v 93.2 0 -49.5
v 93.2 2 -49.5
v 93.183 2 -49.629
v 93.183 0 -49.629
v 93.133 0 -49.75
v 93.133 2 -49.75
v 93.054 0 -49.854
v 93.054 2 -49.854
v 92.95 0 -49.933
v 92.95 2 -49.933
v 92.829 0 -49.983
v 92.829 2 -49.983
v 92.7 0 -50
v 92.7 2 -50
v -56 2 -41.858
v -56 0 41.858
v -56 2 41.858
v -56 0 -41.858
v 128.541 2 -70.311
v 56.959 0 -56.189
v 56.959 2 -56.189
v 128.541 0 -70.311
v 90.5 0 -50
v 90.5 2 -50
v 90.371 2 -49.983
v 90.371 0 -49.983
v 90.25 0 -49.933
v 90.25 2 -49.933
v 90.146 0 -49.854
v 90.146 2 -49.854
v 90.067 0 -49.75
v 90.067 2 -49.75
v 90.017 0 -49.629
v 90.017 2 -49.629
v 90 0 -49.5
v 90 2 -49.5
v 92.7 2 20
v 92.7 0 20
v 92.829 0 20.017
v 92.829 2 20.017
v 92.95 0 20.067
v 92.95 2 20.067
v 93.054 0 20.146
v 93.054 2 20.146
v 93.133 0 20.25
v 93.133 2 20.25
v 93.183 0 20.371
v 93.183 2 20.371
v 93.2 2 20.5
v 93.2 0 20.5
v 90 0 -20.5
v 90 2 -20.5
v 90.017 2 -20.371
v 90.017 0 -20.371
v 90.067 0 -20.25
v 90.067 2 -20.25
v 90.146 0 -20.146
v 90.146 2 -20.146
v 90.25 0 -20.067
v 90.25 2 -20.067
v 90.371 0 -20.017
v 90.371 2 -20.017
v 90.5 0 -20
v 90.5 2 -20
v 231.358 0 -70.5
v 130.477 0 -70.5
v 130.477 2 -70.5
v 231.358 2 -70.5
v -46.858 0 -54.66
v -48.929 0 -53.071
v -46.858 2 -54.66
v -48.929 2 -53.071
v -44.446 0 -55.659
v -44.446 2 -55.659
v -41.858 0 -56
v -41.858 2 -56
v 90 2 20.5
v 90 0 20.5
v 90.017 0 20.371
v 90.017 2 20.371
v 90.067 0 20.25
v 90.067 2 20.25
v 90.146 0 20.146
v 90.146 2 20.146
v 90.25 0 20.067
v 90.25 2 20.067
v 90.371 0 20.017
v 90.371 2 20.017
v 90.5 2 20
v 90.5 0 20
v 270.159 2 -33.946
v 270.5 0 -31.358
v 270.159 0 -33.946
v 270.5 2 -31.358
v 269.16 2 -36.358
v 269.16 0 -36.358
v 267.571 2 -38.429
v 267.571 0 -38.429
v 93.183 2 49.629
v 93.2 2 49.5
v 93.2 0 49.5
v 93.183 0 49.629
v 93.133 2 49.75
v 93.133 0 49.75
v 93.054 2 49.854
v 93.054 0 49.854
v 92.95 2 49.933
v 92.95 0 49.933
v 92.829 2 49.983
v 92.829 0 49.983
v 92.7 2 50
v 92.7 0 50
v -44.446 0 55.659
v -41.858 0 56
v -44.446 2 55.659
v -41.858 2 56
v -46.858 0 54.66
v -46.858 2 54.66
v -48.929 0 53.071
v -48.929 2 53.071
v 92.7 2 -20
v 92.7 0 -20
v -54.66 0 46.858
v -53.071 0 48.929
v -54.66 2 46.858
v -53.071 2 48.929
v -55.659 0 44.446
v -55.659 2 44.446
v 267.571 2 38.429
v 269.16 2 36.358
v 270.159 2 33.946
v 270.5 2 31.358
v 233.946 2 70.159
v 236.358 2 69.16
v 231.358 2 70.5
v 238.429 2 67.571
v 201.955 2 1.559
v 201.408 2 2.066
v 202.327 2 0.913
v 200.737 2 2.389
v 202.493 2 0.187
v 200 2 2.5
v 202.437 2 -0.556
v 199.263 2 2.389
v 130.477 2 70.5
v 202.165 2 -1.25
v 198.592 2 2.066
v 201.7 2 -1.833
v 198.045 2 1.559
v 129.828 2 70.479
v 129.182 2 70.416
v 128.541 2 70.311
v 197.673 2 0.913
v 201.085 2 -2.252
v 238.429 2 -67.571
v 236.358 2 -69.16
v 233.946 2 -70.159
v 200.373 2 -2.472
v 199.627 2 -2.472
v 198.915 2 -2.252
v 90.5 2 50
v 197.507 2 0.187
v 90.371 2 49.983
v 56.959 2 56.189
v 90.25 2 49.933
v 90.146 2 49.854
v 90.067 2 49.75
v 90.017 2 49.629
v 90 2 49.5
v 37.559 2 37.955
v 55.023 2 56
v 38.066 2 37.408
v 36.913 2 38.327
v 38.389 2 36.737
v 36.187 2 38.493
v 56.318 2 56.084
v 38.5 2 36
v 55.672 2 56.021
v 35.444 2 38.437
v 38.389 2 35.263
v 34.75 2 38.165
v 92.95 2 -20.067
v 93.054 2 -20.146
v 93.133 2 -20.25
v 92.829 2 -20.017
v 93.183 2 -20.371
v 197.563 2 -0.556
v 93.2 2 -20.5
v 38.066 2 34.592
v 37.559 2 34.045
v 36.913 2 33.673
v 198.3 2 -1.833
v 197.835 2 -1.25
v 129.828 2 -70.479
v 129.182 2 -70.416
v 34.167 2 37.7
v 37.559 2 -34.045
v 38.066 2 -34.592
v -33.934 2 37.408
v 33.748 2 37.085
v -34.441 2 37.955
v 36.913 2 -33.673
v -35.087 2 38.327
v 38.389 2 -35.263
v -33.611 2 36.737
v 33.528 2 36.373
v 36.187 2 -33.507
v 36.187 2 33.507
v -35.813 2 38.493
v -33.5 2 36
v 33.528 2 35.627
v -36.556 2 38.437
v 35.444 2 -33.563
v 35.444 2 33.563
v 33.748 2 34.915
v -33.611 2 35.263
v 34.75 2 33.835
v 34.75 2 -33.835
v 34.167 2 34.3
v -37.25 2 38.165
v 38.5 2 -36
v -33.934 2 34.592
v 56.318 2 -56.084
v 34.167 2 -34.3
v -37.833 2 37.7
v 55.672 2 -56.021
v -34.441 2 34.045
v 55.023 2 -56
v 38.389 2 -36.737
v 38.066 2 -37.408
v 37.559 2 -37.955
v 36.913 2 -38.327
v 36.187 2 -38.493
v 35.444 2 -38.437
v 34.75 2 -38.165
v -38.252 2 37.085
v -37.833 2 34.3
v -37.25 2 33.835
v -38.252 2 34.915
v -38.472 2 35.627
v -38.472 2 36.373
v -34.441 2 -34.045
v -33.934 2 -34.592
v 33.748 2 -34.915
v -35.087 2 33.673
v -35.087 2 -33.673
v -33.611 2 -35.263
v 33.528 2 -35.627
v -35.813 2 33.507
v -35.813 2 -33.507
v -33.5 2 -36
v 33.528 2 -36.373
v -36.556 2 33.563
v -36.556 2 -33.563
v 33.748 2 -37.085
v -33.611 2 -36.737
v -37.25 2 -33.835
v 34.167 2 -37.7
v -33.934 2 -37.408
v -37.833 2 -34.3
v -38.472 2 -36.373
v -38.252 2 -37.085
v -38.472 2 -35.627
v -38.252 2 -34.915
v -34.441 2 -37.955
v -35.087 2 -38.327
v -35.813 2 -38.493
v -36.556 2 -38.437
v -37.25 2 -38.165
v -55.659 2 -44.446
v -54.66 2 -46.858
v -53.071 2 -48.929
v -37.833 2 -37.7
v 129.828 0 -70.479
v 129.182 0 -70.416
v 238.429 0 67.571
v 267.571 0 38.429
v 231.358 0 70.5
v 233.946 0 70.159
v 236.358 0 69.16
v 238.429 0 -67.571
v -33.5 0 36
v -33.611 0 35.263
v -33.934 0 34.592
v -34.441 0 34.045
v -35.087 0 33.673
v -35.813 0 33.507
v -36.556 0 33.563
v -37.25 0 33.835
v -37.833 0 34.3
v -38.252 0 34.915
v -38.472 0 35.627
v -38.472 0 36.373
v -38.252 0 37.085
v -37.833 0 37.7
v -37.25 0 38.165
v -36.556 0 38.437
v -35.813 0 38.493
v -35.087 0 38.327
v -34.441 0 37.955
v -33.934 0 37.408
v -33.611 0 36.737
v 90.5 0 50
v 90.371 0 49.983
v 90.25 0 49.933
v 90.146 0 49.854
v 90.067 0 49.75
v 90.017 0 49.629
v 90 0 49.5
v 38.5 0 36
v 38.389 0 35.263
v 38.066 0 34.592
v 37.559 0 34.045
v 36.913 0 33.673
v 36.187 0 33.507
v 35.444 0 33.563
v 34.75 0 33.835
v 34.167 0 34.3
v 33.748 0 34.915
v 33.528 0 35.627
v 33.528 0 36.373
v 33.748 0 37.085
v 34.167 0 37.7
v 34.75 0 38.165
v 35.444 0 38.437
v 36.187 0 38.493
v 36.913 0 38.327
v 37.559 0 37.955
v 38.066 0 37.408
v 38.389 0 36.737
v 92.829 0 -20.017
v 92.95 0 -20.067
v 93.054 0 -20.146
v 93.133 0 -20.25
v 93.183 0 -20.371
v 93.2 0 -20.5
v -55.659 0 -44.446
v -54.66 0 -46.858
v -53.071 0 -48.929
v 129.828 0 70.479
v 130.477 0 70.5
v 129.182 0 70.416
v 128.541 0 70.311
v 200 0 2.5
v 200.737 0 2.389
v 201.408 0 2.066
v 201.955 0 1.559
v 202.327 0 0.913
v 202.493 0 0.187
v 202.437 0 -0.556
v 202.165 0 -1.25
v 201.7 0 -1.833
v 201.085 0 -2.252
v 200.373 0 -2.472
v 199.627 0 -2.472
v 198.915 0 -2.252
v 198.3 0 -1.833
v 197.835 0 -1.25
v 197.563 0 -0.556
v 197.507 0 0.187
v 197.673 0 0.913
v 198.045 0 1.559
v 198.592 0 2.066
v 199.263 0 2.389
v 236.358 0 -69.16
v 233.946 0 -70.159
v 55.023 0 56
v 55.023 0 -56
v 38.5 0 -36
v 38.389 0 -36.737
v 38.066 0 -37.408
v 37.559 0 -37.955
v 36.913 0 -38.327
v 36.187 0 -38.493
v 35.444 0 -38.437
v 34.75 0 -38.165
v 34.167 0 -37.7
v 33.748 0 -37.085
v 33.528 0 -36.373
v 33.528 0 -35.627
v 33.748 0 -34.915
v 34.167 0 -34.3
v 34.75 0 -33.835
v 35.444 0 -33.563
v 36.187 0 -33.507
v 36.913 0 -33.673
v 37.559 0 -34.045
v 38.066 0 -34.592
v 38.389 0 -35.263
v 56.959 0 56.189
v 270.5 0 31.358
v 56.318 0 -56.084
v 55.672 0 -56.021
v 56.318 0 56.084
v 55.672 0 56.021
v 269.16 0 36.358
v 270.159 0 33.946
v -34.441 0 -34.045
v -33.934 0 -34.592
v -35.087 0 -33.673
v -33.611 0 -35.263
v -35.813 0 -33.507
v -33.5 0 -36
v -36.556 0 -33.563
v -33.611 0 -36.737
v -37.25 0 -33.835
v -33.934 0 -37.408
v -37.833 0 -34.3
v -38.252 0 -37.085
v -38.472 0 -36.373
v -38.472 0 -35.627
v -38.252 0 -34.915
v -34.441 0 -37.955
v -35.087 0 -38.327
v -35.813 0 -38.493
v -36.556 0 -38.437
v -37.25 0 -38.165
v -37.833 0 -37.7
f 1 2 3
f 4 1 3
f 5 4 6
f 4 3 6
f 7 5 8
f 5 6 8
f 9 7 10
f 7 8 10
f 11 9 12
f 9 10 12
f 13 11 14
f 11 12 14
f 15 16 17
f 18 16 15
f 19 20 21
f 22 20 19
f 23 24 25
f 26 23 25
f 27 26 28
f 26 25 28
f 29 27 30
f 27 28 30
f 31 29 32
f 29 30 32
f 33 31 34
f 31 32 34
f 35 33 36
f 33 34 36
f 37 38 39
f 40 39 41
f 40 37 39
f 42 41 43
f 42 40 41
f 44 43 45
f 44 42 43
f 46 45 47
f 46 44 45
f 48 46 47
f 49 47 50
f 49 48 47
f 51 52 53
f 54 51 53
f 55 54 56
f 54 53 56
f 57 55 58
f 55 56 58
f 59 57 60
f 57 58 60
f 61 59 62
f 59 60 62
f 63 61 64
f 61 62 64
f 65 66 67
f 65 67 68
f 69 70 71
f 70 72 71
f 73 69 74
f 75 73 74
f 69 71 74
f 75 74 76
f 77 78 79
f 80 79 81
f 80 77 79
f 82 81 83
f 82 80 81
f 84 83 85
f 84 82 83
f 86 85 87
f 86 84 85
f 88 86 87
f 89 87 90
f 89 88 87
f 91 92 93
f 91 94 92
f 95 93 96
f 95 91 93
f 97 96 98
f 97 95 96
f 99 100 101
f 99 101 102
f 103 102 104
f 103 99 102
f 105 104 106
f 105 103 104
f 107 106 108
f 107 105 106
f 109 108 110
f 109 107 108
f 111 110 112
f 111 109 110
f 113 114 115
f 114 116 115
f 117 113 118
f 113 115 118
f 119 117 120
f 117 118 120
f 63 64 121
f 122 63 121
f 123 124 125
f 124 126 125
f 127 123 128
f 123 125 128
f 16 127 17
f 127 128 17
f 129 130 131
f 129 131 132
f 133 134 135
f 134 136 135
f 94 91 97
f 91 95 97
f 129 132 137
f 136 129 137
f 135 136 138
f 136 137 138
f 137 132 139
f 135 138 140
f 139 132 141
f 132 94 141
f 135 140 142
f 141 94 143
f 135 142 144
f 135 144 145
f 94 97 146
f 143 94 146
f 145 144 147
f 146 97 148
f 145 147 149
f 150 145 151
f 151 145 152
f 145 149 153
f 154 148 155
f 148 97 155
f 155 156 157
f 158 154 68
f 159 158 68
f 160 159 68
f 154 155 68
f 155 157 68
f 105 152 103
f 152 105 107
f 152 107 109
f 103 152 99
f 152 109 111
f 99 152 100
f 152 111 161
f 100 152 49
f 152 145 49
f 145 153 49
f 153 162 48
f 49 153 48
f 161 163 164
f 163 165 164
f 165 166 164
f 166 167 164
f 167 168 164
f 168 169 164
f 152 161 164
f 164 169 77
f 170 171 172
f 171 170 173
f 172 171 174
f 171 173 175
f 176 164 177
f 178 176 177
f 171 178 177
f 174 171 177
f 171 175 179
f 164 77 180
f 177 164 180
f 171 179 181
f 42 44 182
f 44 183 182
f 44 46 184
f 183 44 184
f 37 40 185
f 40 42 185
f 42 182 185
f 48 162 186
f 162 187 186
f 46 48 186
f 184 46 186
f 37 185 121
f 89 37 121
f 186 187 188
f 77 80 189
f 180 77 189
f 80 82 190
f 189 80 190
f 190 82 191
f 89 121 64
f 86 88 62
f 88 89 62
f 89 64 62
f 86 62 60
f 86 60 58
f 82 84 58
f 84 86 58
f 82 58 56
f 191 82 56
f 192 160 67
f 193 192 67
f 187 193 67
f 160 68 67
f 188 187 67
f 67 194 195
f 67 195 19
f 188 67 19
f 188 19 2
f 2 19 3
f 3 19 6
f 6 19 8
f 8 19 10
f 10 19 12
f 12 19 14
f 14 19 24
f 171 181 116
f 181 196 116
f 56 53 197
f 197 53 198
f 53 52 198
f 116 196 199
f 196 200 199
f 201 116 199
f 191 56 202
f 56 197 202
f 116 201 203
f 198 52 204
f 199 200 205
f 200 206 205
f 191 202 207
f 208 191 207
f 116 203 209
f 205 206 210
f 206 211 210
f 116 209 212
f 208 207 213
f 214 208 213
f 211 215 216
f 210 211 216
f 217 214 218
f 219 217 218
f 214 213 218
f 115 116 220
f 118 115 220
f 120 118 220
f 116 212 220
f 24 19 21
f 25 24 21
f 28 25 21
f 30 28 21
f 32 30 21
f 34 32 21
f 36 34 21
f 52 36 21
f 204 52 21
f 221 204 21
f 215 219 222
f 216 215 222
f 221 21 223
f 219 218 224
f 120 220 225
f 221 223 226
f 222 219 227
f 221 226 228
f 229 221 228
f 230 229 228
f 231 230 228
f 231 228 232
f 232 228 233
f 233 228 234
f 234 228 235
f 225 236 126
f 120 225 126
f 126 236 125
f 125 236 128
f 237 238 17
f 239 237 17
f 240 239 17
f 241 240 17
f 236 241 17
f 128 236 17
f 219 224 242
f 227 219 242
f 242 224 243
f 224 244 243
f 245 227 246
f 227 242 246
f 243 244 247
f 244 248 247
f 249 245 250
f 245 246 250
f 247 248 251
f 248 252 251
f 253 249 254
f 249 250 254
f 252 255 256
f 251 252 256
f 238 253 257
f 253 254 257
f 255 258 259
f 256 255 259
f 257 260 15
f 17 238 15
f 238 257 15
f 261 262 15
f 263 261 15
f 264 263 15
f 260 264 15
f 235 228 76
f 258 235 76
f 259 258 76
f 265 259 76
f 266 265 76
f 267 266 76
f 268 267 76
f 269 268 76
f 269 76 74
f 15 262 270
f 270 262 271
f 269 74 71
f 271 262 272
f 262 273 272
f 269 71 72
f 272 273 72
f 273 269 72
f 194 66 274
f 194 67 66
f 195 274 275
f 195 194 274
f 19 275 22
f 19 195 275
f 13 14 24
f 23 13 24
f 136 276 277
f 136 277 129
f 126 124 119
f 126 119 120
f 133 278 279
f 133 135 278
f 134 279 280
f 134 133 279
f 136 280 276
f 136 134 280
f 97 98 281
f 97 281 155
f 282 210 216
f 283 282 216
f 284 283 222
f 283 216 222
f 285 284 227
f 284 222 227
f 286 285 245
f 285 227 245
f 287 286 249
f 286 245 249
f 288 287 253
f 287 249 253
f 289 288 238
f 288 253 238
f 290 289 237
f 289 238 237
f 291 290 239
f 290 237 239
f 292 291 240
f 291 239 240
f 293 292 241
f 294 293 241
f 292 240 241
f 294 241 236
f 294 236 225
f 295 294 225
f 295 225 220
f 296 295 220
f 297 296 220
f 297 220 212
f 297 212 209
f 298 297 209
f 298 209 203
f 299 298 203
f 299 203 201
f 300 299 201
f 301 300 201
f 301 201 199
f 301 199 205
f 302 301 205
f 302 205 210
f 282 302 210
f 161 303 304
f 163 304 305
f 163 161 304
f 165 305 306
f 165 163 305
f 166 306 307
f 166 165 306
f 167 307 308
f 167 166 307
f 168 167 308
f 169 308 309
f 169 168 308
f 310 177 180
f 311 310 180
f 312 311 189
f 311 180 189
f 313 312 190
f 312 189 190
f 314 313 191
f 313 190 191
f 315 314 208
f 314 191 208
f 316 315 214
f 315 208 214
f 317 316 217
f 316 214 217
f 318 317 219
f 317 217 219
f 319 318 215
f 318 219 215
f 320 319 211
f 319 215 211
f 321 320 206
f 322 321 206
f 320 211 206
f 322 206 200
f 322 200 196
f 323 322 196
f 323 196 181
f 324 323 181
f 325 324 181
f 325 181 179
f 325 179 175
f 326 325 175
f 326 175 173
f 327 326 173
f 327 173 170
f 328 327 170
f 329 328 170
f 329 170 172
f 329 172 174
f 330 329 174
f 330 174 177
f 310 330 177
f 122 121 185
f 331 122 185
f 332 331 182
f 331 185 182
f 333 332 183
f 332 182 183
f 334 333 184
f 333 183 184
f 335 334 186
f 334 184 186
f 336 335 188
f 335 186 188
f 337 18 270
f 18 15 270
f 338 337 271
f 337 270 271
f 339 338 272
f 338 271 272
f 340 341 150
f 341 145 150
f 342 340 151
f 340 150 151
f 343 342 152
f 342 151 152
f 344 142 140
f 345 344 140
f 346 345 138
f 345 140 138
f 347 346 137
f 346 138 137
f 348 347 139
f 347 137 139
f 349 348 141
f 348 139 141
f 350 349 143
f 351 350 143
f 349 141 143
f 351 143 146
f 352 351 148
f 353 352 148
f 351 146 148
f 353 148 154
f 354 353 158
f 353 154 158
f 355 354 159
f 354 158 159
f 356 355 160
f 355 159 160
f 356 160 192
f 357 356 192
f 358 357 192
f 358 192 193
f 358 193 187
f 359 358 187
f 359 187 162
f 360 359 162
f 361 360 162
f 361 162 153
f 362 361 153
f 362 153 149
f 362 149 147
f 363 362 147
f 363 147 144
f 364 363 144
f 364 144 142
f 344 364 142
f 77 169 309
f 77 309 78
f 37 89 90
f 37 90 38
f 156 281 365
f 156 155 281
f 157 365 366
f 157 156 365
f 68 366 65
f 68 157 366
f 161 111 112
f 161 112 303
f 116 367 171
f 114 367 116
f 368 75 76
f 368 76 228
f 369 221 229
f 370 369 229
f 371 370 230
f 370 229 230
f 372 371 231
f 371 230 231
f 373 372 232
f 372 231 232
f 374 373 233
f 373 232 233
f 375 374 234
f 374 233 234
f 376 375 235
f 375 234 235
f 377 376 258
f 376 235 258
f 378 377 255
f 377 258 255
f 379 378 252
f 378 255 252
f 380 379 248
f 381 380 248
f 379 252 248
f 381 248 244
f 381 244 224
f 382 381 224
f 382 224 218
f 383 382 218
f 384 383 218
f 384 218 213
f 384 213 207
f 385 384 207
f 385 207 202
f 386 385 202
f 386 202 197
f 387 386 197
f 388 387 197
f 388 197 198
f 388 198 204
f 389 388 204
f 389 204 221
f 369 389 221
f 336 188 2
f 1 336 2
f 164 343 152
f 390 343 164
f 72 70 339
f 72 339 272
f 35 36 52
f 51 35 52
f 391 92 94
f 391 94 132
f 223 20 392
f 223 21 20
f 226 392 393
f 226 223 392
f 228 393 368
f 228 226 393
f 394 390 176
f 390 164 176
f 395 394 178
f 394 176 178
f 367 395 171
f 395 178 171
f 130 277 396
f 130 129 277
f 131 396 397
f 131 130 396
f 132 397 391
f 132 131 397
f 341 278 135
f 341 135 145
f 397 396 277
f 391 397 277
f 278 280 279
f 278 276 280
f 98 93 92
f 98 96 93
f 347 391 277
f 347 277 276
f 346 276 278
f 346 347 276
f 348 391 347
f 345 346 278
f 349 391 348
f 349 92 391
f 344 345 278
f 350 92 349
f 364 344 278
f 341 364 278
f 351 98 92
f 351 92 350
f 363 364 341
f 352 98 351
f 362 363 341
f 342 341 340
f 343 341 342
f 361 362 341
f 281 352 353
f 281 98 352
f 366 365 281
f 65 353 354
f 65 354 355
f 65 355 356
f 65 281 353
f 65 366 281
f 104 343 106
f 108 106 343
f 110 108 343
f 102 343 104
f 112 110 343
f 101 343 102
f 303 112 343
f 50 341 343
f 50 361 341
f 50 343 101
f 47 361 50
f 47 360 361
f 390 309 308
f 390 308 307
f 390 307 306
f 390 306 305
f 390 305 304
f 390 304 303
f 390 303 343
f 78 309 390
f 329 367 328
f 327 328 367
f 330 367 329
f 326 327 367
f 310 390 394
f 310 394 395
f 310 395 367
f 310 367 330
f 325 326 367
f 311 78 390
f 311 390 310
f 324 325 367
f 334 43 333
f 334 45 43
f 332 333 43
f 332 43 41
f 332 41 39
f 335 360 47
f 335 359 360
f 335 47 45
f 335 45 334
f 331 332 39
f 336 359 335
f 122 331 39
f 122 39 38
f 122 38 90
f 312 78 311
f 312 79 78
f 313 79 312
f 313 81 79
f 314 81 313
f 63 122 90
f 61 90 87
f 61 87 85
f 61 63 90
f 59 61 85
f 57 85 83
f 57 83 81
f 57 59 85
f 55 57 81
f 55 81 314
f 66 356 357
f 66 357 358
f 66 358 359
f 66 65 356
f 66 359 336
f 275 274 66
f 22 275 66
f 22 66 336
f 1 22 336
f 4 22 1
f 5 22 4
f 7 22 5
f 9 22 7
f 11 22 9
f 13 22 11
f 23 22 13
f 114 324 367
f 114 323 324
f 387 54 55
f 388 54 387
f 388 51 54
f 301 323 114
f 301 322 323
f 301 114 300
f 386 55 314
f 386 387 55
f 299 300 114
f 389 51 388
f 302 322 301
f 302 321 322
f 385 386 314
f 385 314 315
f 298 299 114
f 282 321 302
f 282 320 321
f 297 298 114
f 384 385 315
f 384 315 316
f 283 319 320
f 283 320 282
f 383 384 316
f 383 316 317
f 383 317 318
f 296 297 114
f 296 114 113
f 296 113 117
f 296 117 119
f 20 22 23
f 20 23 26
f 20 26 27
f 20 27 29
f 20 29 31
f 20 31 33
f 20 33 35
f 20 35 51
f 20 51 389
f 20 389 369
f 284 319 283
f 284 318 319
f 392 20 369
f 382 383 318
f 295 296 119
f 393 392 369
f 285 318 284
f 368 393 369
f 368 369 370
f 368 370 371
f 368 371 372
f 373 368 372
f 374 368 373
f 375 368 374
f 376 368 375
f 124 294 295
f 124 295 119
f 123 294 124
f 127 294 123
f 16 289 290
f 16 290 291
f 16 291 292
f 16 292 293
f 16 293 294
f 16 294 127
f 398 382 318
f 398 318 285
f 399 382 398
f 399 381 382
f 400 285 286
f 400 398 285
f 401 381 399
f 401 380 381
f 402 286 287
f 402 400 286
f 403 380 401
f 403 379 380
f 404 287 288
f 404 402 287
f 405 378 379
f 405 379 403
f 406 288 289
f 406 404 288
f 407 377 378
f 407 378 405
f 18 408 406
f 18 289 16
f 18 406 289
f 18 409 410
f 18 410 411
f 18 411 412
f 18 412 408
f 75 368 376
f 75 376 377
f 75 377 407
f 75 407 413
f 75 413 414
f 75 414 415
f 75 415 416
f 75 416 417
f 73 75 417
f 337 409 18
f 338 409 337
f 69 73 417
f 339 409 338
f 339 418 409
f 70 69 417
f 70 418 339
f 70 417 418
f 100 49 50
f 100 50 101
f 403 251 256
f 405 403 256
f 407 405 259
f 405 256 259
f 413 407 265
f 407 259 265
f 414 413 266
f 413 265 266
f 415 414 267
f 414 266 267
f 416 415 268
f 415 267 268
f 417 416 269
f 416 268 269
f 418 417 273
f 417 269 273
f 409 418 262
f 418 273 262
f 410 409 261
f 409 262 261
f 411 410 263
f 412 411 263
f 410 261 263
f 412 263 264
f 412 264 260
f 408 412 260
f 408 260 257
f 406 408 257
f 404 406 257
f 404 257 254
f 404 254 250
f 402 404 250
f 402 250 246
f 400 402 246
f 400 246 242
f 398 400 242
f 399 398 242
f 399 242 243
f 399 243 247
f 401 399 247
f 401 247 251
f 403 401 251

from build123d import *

# Parameters (mm, degrees)
BOSS_EXTRUDE1_DEPTH   = 2
CHAMFER1_SIZE         = 10
CHAMFER2_SIZE         = 35
FILLET1_R             = 10
F_5_0MM_DOWEL_HOLE1_D = 5
SKETCH5_R             = 2.5
CUT_EXTRUDE2_DEPTH    = 280.543377672
CUT_EXTRUDE3_DEPTH    = 280.543377672


with BuildPart() as part:
    # Sketch1 → Boss-Extrude1 (new body)
    with BuildSketch(Plane(origin=(0, 0, 0), x_dir=(1, 0, 0), z_dir=(0, 1, 0))):
        Polygon((56, 56), (129.5, 70.5), (270.5, 70.5), (270.5, -70.5), (129.5, -70.5), (56, -56), (-56, -56), (-56, 56), align=None)
    extrude(amount=BOSS_EXTRUDE1_DEPTH)

    # Chamfer1
    chamfer1_edges = [part.edges().sort_by_distance(p)[0] for p in [
        (-56, 1, 56),
        (-56, 1, -56),
    ]]
    chamfer(chamfer1_edges, length=CHAMFER1_SIZE)

    # Chamfer2
    chamfer2_edges = [part.edges().sort_by_distance(p)[0] for p in [
        (270.5, 1, 70.5),
        (270.5, 1, -70.5),
    ]]
    chamfer(chamfer2_edges, length=CHAMFER2_SIZE)

    # Fillet1
    fillet1_edges = [part.edges().sort_by_distance(p)[0] for p in [
        (129.5, 1, 70.5),
        (56, 1, 56),
        (56, 1, -56),
        (129.5, 1, -70.5),
        (-56, 1, 46),
        (-56, 1, -46),
        (-46, 1, -56),
        (-46, 1, 56),
        (235.5, 1, -70.5),
        (270.5, 1, 35.5),
        (270.5, 1, -35.5),
        (235.5, 1, 70.5),
    ]]
    fillet(fillet1_edges, radius=FILLET1_R)

    # Ø5.0mm Dowel Hole1 (through all)
    with Locations(Plane(origin=(0, 0, 0), x_dir=(-1, 0, 0), z_dir=(0, -1, 0))):
        with Locations((36, -36), (-36, -36), (36, 36), (-36, 36)):
            Hole(F_5_0MM_DOWEL_HOLE1_D / 2)

    # Sketch5 → Cut-Extrude2 (cut, through all)
    with BuildSketch(Plane(origin=(0, 2, 0), x_dir=(1, 0, 0), z_dir=(0, 1, 0))):
        with Locations(Location((200, 0, 0), (0, 0, 270))):
            Circle(SKETCH5_R)
    extrude(amount=-CUT_EXTRUDE2_DEPTH, mode=Mode.SUBTRACT)

    # Sketch6 → Cut-Extrude3 (cut, through all)
    with BuildSketch(Plane(origin=(0, 2, 0), x_dir=(1, 0, 0), z_dir=(0, 1, 0))):
        with BuildLine():
            Line((93.2, 20.5), (93.2, 49.5))
            ThreePointArc((93.2, 49.5), (93.053553391, 49.853553391), (92.7, 50))
            Line((92.7, 50), (90.5, 50))
            ThreePointArc((90.5, 50), (90.146446609, 49.853553391), (90, 49.5))
            Line((90, 49.5), (90, 20.5))
            ThreePointArc((90, 20.5), (90.146446609, 20.146446609), (90.5, 20))
            Line((90.5, 20), (92.7, 20))
            ThreePointArc((92.7, 20), (93.053553391, 20.146446609), (93.2, 20.5))
        make_face()
        with BuildLine():
            Line((90.5, -20), (92.7, -20))
            ThreePointArc((92.7, -20), (93.053553391, -20.146446609), (93.2, -20.5))
            Line((93.2, -20.5), (93.2, -49.5))
            ThreePointArc((93.2, -49.5), (93.053553391, -49.853553391), (92.7, -50))
            Line((92.7, -50), (90.5, -50))
            ThreePointArc((90.5, -50), (90.146446609, -49.853553391), (90, -49.5))
            Line((90, -49.5), (90, -20.5))
            ThreePointArc((90, -20.5), (90.146446609, -20.146446609), (90.5, -20))
        make_face()
    extrude(amount=-CUT_EXTRUDE3_DEPTH, mode=Mode.SUBTRACT)


solid = part.part
